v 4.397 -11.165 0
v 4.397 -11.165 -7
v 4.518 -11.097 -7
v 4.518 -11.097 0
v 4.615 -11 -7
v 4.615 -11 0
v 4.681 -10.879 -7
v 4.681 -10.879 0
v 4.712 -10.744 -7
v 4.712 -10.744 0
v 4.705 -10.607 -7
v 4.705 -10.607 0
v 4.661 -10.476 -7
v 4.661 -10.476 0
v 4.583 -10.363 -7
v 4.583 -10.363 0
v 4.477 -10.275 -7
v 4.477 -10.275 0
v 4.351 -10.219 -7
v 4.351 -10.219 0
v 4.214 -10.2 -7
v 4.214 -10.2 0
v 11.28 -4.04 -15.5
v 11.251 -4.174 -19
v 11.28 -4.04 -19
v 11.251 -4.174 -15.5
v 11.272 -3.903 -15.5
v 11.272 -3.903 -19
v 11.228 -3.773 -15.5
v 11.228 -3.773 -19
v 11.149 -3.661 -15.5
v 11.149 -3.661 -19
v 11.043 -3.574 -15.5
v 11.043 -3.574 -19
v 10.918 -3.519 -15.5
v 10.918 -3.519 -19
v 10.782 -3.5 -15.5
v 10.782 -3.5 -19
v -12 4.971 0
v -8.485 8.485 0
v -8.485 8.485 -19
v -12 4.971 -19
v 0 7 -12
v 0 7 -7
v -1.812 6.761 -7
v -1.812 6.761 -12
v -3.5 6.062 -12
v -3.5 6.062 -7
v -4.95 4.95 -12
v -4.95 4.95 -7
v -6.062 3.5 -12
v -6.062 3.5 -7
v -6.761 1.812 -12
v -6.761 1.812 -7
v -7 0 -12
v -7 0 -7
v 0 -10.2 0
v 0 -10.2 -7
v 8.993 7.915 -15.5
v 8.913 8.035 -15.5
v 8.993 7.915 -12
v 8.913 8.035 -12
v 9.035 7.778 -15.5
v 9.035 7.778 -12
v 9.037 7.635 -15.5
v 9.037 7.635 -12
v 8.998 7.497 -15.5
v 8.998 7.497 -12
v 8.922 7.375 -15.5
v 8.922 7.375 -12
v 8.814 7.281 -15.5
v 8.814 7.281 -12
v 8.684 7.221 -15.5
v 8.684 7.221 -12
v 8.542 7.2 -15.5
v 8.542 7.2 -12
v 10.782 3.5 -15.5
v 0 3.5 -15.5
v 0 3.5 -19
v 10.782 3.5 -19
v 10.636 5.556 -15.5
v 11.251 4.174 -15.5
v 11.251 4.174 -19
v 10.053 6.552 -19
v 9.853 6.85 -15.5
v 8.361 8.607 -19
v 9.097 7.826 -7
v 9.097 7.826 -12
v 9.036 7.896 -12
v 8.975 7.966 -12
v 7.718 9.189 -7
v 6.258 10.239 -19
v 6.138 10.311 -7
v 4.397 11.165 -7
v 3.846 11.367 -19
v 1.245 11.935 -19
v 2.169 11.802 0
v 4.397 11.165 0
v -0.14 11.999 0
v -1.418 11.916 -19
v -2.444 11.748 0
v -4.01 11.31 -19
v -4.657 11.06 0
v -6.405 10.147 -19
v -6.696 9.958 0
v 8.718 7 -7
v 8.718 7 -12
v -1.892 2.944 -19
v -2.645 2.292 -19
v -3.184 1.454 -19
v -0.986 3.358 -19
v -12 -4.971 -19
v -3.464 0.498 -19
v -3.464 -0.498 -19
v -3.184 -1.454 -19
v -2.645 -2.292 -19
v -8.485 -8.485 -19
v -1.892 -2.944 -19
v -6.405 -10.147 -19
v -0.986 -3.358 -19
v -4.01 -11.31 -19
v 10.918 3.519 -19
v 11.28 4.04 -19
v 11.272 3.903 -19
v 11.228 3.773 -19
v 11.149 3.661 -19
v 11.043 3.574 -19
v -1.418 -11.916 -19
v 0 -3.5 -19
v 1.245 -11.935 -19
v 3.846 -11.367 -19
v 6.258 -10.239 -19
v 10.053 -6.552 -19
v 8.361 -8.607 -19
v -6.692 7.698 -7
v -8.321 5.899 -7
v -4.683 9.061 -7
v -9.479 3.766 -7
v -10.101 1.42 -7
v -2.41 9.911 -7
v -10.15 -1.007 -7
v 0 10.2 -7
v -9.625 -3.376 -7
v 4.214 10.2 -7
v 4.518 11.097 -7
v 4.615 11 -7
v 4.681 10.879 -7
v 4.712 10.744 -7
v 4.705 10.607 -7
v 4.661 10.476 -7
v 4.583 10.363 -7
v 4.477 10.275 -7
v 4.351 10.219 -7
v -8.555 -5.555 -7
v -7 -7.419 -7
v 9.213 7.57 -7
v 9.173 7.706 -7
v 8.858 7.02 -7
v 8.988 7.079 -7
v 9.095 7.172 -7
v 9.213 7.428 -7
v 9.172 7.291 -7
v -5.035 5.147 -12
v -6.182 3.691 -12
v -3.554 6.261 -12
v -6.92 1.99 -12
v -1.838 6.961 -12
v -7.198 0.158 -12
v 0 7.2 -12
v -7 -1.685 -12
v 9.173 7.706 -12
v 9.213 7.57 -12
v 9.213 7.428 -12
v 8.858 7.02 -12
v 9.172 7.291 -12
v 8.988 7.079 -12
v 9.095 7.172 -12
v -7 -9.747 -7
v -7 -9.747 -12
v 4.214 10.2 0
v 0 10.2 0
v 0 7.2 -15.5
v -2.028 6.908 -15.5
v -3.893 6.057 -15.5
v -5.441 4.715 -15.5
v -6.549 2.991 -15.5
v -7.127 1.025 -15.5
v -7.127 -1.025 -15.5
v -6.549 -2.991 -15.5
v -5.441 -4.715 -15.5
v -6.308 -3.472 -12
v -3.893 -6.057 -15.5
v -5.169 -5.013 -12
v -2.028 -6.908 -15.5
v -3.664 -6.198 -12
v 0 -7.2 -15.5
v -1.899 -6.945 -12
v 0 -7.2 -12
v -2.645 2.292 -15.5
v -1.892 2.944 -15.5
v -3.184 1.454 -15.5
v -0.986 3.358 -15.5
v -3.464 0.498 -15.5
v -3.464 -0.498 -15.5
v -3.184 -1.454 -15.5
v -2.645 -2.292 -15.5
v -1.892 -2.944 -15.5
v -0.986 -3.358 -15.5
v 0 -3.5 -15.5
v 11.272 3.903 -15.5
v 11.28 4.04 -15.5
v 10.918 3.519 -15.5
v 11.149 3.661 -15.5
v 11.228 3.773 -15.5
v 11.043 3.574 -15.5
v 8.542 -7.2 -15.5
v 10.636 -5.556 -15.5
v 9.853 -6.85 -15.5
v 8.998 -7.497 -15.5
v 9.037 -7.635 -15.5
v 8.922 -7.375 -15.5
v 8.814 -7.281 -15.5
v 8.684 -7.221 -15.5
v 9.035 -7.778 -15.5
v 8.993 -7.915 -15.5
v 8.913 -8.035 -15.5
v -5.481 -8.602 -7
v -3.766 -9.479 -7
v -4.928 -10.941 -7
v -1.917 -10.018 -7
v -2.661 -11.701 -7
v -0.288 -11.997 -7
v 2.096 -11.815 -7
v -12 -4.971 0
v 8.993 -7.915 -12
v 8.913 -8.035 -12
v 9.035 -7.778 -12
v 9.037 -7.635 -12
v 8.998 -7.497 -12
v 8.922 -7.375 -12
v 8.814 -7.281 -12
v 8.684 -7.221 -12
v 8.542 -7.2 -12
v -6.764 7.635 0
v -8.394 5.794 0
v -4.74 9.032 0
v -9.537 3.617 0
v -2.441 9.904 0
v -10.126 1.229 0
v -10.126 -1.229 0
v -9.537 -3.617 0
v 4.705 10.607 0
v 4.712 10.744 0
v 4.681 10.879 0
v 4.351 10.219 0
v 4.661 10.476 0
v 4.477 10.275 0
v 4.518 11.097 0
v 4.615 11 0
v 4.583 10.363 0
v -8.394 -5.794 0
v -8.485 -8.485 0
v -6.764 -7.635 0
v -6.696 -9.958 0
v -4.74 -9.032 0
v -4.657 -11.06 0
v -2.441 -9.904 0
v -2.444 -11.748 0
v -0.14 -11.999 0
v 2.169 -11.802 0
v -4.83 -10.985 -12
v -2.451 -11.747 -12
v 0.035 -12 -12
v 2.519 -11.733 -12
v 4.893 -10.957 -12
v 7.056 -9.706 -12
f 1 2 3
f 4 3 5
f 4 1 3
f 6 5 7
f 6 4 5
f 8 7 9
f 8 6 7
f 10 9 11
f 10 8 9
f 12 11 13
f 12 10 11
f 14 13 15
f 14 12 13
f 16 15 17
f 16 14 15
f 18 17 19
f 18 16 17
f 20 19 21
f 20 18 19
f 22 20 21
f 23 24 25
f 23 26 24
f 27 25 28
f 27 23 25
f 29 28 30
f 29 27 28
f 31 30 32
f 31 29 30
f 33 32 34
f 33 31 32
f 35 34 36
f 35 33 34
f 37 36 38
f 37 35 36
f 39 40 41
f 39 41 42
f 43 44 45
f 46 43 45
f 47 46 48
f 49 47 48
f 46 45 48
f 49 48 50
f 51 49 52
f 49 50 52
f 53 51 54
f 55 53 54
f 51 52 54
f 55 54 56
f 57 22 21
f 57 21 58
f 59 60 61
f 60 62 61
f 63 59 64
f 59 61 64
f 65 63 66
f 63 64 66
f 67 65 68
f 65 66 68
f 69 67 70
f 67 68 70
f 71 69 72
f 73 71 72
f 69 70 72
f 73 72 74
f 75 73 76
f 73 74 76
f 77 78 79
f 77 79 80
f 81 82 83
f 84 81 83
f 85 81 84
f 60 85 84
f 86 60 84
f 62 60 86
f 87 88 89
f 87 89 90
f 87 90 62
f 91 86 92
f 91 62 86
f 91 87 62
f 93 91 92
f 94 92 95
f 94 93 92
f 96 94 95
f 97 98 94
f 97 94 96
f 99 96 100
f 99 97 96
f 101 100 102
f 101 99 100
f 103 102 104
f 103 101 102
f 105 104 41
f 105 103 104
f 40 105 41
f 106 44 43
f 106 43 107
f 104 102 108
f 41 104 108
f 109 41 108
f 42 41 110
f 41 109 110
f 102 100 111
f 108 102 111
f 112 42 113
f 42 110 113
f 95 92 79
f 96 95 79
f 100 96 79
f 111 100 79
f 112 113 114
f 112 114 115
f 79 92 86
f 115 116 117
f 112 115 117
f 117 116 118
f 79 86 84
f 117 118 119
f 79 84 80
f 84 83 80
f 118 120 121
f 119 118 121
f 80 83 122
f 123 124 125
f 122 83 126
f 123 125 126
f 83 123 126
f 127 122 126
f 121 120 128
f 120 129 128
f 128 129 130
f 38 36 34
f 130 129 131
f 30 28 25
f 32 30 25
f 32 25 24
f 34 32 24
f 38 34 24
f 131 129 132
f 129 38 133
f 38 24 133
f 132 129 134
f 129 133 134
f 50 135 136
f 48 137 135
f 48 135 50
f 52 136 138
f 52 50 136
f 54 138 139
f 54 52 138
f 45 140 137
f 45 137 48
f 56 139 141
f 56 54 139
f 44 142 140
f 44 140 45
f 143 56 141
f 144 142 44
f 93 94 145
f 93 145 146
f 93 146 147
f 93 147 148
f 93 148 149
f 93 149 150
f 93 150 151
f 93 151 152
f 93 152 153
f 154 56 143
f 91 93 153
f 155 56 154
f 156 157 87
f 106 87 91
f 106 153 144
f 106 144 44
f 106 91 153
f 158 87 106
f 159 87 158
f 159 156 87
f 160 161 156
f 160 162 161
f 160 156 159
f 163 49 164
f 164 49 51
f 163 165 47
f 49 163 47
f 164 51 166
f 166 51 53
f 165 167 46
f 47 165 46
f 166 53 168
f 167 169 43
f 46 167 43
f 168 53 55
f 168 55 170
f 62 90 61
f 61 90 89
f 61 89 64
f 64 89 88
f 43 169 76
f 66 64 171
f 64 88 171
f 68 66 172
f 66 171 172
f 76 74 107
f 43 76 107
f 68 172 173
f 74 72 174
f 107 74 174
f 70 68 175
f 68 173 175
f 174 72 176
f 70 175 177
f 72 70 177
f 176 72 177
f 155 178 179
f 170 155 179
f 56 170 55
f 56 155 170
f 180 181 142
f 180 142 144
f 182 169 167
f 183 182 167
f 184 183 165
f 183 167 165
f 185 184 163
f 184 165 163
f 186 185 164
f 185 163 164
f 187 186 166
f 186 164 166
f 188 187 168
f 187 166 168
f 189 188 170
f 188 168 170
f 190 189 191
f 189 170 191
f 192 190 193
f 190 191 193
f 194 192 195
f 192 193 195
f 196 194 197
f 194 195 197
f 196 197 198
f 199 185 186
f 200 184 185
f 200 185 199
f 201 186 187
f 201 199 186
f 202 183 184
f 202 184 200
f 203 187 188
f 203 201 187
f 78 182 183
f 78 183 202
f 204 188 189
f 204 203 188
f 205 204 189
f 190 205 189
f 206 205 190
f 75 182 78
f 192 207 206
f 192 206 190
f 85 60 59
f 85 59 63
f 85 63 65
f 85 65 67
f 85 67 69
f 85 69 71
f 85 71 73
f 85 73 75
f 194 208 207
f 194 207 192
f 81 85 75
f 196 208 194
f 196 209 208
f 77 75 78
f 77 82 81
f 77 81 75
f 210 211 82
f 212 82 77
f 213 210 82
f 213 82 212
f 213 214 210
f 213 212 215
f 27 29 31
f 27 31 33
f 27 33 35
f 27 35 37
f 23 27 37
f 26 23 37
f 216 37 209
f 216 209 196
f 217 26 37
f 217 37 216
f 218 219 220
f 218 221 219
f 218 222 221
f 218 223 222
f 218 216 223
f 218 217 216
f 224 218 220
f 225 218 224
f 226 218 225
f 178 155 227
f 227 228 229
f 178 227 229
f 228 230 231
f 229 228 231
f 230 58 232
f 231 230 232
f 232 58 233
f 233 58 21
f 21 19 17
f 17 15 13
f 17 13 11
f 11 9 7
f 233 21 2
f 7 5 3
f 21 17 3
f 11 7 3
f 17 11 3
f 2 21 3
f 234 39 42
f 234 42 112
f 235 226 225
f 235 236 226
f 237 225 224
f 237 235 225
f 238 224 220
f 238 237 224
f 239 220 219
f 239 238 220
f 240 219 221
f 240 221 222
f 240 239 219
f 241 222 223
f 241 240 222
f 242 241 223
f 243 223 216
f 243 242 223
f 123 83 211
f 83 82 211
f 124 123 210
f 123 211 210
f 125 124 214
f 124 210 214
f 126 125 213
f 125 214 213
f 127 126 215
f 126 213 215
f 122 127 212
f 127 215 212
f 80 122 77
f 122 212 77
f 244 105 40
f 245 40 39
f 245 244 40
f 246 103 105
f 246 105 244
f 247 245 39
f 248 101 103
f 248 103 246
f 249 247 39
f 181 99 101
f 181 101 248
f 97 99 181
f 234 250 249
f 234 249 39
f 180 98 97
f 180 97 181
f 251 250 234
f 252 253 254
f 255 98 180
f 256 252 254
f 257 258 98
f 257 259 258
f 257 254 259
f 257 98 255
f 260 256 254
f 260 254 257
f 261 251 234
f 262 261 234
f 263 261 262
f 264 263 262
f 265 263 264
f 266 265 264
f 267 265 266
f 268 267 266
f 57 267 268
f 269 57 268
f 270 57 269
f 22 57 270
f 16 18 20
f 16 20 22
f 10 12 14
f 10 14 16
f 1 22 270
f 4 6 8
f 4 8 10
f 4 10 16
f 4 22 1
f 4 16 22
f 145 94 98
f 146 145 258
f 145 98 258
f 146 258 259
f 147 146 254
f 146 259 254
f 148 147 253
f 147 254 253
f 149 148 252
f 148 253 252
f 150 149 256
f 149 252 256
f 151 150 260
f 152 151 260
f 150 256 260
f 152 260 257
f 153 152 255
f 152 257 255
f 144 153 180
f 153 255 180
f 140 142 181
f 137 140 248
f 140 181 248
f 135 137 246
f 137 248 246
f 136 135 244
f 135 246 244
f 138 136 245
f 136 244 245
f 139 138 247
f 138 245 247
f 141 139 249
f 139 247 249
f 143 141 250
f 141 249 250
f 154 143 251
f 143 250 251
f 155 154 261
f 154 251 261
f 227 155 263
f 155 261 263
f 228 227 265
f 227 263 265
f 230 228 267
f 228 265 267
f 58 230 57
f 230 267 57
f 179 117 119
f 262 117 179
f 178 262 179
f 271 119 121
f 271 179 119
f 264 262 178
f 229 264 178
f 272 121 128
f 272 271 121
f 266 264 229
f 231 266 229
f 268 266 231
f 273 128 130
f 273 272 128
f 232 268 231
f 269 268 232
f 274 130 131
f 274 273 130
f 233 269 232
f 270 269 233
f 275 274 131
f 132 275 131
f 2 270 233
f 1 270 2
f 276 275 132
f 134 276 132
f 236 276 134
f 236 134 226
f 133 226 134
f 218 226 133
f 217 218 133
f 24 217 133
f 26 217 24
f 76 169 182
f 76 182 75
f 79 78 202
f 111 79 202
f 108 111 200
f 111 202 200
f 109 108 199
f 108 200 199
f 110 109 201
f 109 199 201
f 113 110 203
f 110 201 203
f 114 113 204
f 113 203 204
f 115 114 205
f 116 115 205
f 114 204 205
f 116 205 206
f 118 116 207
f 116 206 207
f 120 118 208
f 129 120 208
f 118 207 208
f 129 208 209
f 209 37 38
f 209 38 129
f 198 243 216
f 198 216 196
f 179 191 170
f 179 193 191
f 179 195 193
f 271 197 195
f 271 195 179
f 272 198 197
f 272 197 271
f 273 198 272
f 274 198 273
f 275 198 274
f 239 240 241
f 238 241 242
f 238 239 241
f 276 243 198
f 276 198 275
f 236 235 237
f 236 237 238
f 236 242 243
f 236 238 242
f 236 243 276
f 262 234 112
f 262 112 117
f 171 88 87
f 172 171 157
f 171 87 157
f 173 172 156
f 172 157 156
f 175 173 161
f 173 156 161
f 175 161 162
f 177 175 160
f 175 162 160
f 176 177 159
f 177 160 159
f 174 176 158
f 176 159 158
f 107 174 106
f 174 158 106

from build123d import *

# Parameters (mm, degrees)
PAD_DEPTH       = 19
POCKET_DEPTH    = 7
POCKET001_DEPTH = 5
POCKET002_DEPTH = 3.5
POCKET003_DEPTH = 3.501
FILLET_R        = 0.5
FILLET001_R     = 0.5


with BuildPart() as part:
    # Sketch → Pad (new body)
    with BuildSketch(Plane(origin=(0, 0, 0), x_dir=(0, -1, 0), z_dir=(0, 0, 1))):
        with BuildLine():
            ThreePointArc((8.485307, -8.485256), (0, 12), (-8.485307, -8.485256))
            Line((-8.485307, -8.485256), (-4.970563, -12))
            Line((-4.970563, -12), (4.970563, -12))
            Line((4.970563, -12), (8.485307, -8.485256))
        make_face()
    extrude(amount=-PAD_DEPTH)

    # Sketch002 → Pocket (cut)
    with BuildSketch(Plane(origin=(0, 0, 0), x_dir=(0, -1, 0), z_dir=(0, 0, 1))):
        with BuildLine():
            ThreePointArc((-10.2, 0), (0, -10.2), (10.2, 0))
            Line((10.2, 20), (10.2, 0))
            Line((-10.2, 20), (10.2, 20))
            Line((-10.2, 0), (-10.2, 20))
        make_face()
    extrude(amount=-POCKET_DEPTH, mode=Mode.SUBTRACT)

    # Sketch003 → Pocket001 (cut)
    with BuildSketch(Plane(origin=(0, 0, -7), x_dir=(0, -1, 0), z_dir=(0, 0, 1))):
        with BuildLine():
            ThreePointArc((-7, 0), (-4.949747, -4.949747), (0, -7))
            Line((20, -7), (0, -7))
            Line((20, 20), (20, -7))
            Line((-7, 20), (20, 20))
            Line((-7, 0), (-7, 20))
        make_face()
    extrude(amount=-POCKET001_DEPTH, mode=Mode.SUBTRACT)

    # Sketch004 → Pocket002 (cut)
    with BuildSketch(Plane(origin=(0, 0, -12), x_dir=(0, -1, 0), z_dir=(0, 0, 1))):
        with BuildLine():
            ThreePointArc((-7.2, 0), (0, -7.2), (7.2, 0))
            Line((7.2, 20), (7.2, 0))
            Line((-7.2, 20), (7.2, 20))
            Line((-7.2, 0), (-7.2, 20))
        make_face()
    extrude(amount=-POCKET002_DEPTH, mode=Mode.SUBTRACT)

    # Sketch005 → Pocket003 (cut, through all)
    with BuildSketch(Plane(origin=(0, 0, -15.5), x_dir=(0, -1, 0), z_dir=(0, 0, 1))):
        with BuildLine():
            ThreePointArc((-3.5, -1e-06), (0, -3.5), (3.5, 0))
            Line((3.5, 20), (3.5, 0))
            Line((-3.5, 20), (3.5, 20))
            Line((-3.5, -1e-06), (-3.5, 20))
        make_face()
    extrude(amount=-POCKET003_DEPTH, mode=Mode.SUBTRACT)

    # Fillet
    fillet_edges = [part.edges().sort_by_distance(p)[0] for p in [
        (6.321392, -10.2, -3.5),
        (9.6, -7.2, -13.75),
        (11.47824, -3.5, -17.25),
        (11.47824, 3.5, -17.25),
        (9.6, 7.2, -13.75),
        (6.321392, 10.2, -3.5),
    ]]
    fillet(fillet_edges, radius=FILLET_R)

    # Fillet001
    fillet001_edges = [part.edges().sort_by_distance(p)[0] for p in [
        (9.746794, 7, -9.5),
    ]]
    fillet(fillet001_edges, radius=FILLET001_R)


solid = part.part
